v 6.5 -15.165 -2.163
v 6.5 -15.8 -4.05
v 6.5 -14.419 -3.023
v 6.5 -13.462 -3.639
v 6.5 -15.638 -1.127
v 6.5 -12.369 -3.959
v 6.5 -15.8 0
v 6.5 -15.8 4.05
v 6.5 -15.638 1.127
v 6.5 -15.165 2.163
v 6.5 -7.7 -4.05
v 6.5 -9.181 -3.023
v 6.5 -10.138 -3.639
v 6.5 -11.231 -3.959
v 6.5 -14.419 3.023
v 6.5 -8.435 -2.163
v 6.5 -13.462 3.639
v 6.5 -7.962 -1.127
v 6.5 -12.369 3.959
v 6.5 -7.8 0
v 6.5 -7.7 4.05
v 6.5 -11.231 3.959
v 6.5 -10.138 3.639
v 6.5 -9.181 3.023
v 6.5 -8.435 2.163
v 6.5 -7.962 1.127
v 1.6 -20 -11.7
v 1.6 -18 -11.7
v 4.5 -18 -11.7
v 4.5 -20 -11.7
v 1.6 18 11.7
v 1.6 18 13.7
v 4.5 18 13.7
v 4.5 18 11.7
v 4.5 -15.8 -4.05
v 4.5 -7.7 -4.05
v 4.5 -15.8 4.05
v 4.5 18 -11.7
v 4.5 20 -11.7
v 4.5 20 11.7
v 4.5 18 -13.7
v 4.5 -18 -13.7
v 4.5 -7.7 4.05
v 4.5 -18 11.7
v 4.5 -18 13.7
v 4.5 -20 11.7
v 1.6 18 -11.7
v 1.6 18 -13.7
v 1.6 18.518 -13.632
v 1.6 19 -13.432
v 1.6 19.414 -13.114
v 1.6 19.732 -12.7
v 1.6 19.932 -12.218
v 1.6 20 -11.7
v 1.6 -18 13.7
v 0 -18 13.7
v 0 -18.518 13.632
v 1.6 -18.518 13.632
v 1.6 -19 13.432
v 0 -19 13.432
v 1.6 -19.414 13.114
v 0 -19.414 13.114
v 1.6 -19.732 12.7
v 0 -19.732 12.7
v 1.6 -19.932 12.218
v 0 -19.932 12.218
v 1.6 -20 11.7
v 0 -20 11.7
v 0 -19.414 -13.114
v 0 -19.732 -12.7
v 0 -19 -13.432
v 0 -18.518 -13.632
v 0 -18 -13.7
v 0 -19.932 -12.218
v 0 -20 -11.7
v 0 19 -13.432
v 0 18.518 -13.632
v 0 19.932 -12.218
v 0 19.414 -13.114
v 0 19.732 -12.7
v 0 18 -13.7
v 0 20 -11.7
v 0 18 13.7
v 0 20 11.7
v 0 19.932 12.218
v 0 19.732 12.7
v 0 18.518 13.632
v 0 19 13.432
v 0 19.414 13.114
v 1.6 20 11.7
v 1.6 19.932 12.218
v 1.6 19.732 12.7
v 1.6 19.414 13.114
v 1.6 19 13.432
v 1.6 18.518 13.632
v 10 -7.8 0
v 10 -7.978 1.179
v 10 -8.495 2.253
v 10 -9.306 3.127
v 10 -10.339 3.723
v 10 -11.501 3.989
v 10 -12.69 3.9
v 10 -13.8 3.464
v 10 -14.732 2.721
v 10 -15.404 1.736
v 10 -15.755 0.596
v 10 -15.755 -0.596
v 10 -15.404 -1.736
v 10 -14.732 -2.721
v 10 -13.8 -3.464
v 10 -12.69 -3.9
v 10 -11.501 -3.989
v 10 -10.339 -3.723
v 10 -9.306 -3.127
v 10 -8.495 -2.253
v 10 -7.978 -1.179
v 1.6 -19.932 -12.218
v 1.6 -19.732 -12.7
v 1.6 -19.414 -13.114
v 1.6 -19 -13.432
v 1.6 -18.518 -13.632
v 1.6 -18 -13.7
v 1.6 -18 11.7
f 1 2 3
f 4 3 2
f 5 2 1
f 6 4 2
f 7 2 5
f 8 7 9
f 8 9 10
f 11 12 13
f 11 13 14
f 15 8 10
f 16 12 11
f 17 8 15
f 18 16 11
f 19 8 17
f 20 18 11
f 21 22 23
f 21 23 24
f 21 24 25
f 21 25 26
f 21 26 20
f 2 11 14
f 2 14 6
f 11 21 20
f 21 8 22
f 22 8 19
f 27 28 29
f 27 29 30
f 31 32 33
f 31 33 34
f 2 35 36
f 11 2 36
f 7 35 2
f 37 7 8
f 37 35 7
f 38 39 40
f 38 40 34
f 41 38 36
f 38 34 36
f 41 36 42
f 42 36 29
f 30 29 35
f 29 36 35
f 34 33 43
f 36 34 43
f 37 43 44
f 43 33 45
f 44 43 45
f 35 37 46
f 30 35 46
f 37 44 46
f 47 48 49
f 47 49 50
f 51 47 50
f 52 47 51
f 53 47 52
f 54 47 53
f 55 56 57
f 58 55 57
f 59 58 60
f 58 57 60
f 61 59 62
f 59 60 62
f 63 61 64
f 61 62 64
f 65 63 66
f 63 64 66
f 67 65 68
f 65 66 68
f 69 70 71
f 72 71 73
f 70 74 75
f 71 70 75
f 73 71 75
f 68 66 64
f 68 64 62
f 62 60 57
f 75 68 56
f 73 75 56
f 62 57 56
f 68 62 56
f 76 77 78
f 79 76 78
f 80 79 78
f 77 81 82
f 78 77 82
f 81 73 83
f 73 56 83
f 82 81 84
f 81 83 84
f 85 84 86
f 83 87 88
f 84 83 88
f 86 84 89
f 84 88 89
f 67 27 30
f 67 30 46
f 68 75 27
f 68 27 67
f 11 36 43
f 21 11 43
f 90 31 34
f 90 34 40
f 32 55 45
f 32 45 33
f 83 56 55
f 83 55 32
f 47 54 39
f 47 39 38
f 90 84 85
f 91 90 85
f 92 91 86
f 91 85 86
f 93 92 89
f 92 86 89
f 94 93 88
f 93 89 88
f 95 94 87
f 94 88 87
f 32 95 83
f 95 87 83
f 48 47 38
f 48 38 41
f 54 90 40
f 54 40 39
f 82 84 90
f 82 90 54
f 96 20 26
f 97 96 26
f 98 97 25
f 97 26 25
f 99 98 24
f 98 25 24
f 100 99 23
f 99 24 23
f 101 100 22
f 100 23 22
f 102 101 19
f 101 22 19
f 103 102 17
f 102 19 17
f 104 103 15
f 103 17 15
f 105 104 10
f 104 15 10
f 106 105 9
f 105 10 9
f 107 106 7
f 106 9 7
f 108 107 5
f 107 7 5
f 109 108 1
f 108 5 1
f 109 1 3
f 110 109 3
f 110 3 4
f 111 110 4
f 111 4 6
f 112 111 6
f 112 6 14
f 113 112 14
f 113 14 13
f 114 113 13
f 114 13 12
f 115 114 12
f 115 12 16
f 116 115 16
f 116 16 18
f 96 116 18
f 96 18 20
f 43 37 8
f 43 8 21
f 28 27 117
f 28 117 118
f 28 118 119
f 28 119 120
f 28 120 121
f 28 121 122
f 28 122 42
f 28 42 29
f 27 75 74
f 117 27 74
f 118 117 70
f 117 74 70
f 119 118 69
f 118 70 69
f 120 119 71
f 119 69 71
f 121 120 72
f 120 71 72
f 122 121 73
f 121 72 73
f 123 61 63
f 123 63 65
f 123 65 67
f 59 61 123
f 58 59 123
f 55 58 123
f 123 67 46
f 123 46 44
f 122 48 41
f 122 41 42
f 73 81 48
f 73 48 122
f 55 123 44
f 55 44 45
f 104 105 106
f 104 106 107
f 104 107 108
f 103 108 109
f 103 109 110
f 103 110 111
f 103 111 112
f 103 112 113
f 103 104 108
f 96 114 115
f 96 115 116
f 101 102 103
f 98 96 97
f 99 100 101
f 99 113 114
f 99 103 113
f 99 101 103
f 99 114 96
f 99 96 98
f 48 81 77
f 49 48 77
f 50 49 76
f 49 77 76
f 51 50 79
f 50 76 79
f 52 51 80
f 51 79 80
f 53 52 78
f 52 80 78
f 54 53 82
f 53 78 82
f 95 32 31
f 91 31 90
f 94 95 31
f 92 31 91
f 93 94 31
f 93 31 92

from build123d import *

# Parameters (mm, degrees)
PAD002_DEPTH = 1.6
PAD003_DEPTH = 4.5
SKETCH015_W  = 8.1
SKETCH015_H  = 8.1
PAD004_DEPTH = 6.5
SKETCH016_R  = 4
PAD005_DEPTH = 10


with BuildPart() as part:
    # Sketch013 → Pad002 (new body)
    with BuildSketch(Plane.YZ):
        with BuildLine():
            ThreePointArc((-18, 13.7), (-19.414214, 13.114214), (-20, 11.7))
            Line((-20, -11.7), (-20, 11.7))
            ThreePointArc((-20, -11.7), (-19.414214, -13.114214), (-18, -13.7))
            Line((18, -13.7), (-18, -13.7))
            ThreePointArc((18, -13.7), (19.414214, -13.114214), (20, -11.7))
            Line((20, 11.7), (20, -11.7))
            ThreePointArc((20, 11.7), (19.414214, 13.114214), (18, 13.7))
            Line((-18, 13.7), (18, 13.7))
        make_face()
    extrude(amount=PAD002_DEPTH)

    # Sketch014 → Pad003 (join)
    with BuildSketch(Plane.YZ):
        Polygon((-18, 13.7), (18, 13.7), (18, 11.7), (20, 11.7), (20, -11.7), (18, -11.7), (18, -13.7), (-18, -13.7), (-18, -11.7), (-20, -11.7), (-20, 11.7), (-18, 11.7), align=None)
    extrude(amount=PAD003_DEPTH)

    # Sketch015 → Pad004 (join)
    with BuildSketch(Plane.YZ):
        with Locations((-11.75, 0)):
            Rectangle(SKETCH015_W, SKETCH015_H)
    extrude(amount=PAD004_DEPTH)

    # Sketch016 → Pad005 (join)
    with BuildSketch(Plane.YZ):
        with Locations((-11.8, 0)):
            Circle(SKETCH016_R)
    extrude(amount=PAD005_DEPTH)


solid = part.part
